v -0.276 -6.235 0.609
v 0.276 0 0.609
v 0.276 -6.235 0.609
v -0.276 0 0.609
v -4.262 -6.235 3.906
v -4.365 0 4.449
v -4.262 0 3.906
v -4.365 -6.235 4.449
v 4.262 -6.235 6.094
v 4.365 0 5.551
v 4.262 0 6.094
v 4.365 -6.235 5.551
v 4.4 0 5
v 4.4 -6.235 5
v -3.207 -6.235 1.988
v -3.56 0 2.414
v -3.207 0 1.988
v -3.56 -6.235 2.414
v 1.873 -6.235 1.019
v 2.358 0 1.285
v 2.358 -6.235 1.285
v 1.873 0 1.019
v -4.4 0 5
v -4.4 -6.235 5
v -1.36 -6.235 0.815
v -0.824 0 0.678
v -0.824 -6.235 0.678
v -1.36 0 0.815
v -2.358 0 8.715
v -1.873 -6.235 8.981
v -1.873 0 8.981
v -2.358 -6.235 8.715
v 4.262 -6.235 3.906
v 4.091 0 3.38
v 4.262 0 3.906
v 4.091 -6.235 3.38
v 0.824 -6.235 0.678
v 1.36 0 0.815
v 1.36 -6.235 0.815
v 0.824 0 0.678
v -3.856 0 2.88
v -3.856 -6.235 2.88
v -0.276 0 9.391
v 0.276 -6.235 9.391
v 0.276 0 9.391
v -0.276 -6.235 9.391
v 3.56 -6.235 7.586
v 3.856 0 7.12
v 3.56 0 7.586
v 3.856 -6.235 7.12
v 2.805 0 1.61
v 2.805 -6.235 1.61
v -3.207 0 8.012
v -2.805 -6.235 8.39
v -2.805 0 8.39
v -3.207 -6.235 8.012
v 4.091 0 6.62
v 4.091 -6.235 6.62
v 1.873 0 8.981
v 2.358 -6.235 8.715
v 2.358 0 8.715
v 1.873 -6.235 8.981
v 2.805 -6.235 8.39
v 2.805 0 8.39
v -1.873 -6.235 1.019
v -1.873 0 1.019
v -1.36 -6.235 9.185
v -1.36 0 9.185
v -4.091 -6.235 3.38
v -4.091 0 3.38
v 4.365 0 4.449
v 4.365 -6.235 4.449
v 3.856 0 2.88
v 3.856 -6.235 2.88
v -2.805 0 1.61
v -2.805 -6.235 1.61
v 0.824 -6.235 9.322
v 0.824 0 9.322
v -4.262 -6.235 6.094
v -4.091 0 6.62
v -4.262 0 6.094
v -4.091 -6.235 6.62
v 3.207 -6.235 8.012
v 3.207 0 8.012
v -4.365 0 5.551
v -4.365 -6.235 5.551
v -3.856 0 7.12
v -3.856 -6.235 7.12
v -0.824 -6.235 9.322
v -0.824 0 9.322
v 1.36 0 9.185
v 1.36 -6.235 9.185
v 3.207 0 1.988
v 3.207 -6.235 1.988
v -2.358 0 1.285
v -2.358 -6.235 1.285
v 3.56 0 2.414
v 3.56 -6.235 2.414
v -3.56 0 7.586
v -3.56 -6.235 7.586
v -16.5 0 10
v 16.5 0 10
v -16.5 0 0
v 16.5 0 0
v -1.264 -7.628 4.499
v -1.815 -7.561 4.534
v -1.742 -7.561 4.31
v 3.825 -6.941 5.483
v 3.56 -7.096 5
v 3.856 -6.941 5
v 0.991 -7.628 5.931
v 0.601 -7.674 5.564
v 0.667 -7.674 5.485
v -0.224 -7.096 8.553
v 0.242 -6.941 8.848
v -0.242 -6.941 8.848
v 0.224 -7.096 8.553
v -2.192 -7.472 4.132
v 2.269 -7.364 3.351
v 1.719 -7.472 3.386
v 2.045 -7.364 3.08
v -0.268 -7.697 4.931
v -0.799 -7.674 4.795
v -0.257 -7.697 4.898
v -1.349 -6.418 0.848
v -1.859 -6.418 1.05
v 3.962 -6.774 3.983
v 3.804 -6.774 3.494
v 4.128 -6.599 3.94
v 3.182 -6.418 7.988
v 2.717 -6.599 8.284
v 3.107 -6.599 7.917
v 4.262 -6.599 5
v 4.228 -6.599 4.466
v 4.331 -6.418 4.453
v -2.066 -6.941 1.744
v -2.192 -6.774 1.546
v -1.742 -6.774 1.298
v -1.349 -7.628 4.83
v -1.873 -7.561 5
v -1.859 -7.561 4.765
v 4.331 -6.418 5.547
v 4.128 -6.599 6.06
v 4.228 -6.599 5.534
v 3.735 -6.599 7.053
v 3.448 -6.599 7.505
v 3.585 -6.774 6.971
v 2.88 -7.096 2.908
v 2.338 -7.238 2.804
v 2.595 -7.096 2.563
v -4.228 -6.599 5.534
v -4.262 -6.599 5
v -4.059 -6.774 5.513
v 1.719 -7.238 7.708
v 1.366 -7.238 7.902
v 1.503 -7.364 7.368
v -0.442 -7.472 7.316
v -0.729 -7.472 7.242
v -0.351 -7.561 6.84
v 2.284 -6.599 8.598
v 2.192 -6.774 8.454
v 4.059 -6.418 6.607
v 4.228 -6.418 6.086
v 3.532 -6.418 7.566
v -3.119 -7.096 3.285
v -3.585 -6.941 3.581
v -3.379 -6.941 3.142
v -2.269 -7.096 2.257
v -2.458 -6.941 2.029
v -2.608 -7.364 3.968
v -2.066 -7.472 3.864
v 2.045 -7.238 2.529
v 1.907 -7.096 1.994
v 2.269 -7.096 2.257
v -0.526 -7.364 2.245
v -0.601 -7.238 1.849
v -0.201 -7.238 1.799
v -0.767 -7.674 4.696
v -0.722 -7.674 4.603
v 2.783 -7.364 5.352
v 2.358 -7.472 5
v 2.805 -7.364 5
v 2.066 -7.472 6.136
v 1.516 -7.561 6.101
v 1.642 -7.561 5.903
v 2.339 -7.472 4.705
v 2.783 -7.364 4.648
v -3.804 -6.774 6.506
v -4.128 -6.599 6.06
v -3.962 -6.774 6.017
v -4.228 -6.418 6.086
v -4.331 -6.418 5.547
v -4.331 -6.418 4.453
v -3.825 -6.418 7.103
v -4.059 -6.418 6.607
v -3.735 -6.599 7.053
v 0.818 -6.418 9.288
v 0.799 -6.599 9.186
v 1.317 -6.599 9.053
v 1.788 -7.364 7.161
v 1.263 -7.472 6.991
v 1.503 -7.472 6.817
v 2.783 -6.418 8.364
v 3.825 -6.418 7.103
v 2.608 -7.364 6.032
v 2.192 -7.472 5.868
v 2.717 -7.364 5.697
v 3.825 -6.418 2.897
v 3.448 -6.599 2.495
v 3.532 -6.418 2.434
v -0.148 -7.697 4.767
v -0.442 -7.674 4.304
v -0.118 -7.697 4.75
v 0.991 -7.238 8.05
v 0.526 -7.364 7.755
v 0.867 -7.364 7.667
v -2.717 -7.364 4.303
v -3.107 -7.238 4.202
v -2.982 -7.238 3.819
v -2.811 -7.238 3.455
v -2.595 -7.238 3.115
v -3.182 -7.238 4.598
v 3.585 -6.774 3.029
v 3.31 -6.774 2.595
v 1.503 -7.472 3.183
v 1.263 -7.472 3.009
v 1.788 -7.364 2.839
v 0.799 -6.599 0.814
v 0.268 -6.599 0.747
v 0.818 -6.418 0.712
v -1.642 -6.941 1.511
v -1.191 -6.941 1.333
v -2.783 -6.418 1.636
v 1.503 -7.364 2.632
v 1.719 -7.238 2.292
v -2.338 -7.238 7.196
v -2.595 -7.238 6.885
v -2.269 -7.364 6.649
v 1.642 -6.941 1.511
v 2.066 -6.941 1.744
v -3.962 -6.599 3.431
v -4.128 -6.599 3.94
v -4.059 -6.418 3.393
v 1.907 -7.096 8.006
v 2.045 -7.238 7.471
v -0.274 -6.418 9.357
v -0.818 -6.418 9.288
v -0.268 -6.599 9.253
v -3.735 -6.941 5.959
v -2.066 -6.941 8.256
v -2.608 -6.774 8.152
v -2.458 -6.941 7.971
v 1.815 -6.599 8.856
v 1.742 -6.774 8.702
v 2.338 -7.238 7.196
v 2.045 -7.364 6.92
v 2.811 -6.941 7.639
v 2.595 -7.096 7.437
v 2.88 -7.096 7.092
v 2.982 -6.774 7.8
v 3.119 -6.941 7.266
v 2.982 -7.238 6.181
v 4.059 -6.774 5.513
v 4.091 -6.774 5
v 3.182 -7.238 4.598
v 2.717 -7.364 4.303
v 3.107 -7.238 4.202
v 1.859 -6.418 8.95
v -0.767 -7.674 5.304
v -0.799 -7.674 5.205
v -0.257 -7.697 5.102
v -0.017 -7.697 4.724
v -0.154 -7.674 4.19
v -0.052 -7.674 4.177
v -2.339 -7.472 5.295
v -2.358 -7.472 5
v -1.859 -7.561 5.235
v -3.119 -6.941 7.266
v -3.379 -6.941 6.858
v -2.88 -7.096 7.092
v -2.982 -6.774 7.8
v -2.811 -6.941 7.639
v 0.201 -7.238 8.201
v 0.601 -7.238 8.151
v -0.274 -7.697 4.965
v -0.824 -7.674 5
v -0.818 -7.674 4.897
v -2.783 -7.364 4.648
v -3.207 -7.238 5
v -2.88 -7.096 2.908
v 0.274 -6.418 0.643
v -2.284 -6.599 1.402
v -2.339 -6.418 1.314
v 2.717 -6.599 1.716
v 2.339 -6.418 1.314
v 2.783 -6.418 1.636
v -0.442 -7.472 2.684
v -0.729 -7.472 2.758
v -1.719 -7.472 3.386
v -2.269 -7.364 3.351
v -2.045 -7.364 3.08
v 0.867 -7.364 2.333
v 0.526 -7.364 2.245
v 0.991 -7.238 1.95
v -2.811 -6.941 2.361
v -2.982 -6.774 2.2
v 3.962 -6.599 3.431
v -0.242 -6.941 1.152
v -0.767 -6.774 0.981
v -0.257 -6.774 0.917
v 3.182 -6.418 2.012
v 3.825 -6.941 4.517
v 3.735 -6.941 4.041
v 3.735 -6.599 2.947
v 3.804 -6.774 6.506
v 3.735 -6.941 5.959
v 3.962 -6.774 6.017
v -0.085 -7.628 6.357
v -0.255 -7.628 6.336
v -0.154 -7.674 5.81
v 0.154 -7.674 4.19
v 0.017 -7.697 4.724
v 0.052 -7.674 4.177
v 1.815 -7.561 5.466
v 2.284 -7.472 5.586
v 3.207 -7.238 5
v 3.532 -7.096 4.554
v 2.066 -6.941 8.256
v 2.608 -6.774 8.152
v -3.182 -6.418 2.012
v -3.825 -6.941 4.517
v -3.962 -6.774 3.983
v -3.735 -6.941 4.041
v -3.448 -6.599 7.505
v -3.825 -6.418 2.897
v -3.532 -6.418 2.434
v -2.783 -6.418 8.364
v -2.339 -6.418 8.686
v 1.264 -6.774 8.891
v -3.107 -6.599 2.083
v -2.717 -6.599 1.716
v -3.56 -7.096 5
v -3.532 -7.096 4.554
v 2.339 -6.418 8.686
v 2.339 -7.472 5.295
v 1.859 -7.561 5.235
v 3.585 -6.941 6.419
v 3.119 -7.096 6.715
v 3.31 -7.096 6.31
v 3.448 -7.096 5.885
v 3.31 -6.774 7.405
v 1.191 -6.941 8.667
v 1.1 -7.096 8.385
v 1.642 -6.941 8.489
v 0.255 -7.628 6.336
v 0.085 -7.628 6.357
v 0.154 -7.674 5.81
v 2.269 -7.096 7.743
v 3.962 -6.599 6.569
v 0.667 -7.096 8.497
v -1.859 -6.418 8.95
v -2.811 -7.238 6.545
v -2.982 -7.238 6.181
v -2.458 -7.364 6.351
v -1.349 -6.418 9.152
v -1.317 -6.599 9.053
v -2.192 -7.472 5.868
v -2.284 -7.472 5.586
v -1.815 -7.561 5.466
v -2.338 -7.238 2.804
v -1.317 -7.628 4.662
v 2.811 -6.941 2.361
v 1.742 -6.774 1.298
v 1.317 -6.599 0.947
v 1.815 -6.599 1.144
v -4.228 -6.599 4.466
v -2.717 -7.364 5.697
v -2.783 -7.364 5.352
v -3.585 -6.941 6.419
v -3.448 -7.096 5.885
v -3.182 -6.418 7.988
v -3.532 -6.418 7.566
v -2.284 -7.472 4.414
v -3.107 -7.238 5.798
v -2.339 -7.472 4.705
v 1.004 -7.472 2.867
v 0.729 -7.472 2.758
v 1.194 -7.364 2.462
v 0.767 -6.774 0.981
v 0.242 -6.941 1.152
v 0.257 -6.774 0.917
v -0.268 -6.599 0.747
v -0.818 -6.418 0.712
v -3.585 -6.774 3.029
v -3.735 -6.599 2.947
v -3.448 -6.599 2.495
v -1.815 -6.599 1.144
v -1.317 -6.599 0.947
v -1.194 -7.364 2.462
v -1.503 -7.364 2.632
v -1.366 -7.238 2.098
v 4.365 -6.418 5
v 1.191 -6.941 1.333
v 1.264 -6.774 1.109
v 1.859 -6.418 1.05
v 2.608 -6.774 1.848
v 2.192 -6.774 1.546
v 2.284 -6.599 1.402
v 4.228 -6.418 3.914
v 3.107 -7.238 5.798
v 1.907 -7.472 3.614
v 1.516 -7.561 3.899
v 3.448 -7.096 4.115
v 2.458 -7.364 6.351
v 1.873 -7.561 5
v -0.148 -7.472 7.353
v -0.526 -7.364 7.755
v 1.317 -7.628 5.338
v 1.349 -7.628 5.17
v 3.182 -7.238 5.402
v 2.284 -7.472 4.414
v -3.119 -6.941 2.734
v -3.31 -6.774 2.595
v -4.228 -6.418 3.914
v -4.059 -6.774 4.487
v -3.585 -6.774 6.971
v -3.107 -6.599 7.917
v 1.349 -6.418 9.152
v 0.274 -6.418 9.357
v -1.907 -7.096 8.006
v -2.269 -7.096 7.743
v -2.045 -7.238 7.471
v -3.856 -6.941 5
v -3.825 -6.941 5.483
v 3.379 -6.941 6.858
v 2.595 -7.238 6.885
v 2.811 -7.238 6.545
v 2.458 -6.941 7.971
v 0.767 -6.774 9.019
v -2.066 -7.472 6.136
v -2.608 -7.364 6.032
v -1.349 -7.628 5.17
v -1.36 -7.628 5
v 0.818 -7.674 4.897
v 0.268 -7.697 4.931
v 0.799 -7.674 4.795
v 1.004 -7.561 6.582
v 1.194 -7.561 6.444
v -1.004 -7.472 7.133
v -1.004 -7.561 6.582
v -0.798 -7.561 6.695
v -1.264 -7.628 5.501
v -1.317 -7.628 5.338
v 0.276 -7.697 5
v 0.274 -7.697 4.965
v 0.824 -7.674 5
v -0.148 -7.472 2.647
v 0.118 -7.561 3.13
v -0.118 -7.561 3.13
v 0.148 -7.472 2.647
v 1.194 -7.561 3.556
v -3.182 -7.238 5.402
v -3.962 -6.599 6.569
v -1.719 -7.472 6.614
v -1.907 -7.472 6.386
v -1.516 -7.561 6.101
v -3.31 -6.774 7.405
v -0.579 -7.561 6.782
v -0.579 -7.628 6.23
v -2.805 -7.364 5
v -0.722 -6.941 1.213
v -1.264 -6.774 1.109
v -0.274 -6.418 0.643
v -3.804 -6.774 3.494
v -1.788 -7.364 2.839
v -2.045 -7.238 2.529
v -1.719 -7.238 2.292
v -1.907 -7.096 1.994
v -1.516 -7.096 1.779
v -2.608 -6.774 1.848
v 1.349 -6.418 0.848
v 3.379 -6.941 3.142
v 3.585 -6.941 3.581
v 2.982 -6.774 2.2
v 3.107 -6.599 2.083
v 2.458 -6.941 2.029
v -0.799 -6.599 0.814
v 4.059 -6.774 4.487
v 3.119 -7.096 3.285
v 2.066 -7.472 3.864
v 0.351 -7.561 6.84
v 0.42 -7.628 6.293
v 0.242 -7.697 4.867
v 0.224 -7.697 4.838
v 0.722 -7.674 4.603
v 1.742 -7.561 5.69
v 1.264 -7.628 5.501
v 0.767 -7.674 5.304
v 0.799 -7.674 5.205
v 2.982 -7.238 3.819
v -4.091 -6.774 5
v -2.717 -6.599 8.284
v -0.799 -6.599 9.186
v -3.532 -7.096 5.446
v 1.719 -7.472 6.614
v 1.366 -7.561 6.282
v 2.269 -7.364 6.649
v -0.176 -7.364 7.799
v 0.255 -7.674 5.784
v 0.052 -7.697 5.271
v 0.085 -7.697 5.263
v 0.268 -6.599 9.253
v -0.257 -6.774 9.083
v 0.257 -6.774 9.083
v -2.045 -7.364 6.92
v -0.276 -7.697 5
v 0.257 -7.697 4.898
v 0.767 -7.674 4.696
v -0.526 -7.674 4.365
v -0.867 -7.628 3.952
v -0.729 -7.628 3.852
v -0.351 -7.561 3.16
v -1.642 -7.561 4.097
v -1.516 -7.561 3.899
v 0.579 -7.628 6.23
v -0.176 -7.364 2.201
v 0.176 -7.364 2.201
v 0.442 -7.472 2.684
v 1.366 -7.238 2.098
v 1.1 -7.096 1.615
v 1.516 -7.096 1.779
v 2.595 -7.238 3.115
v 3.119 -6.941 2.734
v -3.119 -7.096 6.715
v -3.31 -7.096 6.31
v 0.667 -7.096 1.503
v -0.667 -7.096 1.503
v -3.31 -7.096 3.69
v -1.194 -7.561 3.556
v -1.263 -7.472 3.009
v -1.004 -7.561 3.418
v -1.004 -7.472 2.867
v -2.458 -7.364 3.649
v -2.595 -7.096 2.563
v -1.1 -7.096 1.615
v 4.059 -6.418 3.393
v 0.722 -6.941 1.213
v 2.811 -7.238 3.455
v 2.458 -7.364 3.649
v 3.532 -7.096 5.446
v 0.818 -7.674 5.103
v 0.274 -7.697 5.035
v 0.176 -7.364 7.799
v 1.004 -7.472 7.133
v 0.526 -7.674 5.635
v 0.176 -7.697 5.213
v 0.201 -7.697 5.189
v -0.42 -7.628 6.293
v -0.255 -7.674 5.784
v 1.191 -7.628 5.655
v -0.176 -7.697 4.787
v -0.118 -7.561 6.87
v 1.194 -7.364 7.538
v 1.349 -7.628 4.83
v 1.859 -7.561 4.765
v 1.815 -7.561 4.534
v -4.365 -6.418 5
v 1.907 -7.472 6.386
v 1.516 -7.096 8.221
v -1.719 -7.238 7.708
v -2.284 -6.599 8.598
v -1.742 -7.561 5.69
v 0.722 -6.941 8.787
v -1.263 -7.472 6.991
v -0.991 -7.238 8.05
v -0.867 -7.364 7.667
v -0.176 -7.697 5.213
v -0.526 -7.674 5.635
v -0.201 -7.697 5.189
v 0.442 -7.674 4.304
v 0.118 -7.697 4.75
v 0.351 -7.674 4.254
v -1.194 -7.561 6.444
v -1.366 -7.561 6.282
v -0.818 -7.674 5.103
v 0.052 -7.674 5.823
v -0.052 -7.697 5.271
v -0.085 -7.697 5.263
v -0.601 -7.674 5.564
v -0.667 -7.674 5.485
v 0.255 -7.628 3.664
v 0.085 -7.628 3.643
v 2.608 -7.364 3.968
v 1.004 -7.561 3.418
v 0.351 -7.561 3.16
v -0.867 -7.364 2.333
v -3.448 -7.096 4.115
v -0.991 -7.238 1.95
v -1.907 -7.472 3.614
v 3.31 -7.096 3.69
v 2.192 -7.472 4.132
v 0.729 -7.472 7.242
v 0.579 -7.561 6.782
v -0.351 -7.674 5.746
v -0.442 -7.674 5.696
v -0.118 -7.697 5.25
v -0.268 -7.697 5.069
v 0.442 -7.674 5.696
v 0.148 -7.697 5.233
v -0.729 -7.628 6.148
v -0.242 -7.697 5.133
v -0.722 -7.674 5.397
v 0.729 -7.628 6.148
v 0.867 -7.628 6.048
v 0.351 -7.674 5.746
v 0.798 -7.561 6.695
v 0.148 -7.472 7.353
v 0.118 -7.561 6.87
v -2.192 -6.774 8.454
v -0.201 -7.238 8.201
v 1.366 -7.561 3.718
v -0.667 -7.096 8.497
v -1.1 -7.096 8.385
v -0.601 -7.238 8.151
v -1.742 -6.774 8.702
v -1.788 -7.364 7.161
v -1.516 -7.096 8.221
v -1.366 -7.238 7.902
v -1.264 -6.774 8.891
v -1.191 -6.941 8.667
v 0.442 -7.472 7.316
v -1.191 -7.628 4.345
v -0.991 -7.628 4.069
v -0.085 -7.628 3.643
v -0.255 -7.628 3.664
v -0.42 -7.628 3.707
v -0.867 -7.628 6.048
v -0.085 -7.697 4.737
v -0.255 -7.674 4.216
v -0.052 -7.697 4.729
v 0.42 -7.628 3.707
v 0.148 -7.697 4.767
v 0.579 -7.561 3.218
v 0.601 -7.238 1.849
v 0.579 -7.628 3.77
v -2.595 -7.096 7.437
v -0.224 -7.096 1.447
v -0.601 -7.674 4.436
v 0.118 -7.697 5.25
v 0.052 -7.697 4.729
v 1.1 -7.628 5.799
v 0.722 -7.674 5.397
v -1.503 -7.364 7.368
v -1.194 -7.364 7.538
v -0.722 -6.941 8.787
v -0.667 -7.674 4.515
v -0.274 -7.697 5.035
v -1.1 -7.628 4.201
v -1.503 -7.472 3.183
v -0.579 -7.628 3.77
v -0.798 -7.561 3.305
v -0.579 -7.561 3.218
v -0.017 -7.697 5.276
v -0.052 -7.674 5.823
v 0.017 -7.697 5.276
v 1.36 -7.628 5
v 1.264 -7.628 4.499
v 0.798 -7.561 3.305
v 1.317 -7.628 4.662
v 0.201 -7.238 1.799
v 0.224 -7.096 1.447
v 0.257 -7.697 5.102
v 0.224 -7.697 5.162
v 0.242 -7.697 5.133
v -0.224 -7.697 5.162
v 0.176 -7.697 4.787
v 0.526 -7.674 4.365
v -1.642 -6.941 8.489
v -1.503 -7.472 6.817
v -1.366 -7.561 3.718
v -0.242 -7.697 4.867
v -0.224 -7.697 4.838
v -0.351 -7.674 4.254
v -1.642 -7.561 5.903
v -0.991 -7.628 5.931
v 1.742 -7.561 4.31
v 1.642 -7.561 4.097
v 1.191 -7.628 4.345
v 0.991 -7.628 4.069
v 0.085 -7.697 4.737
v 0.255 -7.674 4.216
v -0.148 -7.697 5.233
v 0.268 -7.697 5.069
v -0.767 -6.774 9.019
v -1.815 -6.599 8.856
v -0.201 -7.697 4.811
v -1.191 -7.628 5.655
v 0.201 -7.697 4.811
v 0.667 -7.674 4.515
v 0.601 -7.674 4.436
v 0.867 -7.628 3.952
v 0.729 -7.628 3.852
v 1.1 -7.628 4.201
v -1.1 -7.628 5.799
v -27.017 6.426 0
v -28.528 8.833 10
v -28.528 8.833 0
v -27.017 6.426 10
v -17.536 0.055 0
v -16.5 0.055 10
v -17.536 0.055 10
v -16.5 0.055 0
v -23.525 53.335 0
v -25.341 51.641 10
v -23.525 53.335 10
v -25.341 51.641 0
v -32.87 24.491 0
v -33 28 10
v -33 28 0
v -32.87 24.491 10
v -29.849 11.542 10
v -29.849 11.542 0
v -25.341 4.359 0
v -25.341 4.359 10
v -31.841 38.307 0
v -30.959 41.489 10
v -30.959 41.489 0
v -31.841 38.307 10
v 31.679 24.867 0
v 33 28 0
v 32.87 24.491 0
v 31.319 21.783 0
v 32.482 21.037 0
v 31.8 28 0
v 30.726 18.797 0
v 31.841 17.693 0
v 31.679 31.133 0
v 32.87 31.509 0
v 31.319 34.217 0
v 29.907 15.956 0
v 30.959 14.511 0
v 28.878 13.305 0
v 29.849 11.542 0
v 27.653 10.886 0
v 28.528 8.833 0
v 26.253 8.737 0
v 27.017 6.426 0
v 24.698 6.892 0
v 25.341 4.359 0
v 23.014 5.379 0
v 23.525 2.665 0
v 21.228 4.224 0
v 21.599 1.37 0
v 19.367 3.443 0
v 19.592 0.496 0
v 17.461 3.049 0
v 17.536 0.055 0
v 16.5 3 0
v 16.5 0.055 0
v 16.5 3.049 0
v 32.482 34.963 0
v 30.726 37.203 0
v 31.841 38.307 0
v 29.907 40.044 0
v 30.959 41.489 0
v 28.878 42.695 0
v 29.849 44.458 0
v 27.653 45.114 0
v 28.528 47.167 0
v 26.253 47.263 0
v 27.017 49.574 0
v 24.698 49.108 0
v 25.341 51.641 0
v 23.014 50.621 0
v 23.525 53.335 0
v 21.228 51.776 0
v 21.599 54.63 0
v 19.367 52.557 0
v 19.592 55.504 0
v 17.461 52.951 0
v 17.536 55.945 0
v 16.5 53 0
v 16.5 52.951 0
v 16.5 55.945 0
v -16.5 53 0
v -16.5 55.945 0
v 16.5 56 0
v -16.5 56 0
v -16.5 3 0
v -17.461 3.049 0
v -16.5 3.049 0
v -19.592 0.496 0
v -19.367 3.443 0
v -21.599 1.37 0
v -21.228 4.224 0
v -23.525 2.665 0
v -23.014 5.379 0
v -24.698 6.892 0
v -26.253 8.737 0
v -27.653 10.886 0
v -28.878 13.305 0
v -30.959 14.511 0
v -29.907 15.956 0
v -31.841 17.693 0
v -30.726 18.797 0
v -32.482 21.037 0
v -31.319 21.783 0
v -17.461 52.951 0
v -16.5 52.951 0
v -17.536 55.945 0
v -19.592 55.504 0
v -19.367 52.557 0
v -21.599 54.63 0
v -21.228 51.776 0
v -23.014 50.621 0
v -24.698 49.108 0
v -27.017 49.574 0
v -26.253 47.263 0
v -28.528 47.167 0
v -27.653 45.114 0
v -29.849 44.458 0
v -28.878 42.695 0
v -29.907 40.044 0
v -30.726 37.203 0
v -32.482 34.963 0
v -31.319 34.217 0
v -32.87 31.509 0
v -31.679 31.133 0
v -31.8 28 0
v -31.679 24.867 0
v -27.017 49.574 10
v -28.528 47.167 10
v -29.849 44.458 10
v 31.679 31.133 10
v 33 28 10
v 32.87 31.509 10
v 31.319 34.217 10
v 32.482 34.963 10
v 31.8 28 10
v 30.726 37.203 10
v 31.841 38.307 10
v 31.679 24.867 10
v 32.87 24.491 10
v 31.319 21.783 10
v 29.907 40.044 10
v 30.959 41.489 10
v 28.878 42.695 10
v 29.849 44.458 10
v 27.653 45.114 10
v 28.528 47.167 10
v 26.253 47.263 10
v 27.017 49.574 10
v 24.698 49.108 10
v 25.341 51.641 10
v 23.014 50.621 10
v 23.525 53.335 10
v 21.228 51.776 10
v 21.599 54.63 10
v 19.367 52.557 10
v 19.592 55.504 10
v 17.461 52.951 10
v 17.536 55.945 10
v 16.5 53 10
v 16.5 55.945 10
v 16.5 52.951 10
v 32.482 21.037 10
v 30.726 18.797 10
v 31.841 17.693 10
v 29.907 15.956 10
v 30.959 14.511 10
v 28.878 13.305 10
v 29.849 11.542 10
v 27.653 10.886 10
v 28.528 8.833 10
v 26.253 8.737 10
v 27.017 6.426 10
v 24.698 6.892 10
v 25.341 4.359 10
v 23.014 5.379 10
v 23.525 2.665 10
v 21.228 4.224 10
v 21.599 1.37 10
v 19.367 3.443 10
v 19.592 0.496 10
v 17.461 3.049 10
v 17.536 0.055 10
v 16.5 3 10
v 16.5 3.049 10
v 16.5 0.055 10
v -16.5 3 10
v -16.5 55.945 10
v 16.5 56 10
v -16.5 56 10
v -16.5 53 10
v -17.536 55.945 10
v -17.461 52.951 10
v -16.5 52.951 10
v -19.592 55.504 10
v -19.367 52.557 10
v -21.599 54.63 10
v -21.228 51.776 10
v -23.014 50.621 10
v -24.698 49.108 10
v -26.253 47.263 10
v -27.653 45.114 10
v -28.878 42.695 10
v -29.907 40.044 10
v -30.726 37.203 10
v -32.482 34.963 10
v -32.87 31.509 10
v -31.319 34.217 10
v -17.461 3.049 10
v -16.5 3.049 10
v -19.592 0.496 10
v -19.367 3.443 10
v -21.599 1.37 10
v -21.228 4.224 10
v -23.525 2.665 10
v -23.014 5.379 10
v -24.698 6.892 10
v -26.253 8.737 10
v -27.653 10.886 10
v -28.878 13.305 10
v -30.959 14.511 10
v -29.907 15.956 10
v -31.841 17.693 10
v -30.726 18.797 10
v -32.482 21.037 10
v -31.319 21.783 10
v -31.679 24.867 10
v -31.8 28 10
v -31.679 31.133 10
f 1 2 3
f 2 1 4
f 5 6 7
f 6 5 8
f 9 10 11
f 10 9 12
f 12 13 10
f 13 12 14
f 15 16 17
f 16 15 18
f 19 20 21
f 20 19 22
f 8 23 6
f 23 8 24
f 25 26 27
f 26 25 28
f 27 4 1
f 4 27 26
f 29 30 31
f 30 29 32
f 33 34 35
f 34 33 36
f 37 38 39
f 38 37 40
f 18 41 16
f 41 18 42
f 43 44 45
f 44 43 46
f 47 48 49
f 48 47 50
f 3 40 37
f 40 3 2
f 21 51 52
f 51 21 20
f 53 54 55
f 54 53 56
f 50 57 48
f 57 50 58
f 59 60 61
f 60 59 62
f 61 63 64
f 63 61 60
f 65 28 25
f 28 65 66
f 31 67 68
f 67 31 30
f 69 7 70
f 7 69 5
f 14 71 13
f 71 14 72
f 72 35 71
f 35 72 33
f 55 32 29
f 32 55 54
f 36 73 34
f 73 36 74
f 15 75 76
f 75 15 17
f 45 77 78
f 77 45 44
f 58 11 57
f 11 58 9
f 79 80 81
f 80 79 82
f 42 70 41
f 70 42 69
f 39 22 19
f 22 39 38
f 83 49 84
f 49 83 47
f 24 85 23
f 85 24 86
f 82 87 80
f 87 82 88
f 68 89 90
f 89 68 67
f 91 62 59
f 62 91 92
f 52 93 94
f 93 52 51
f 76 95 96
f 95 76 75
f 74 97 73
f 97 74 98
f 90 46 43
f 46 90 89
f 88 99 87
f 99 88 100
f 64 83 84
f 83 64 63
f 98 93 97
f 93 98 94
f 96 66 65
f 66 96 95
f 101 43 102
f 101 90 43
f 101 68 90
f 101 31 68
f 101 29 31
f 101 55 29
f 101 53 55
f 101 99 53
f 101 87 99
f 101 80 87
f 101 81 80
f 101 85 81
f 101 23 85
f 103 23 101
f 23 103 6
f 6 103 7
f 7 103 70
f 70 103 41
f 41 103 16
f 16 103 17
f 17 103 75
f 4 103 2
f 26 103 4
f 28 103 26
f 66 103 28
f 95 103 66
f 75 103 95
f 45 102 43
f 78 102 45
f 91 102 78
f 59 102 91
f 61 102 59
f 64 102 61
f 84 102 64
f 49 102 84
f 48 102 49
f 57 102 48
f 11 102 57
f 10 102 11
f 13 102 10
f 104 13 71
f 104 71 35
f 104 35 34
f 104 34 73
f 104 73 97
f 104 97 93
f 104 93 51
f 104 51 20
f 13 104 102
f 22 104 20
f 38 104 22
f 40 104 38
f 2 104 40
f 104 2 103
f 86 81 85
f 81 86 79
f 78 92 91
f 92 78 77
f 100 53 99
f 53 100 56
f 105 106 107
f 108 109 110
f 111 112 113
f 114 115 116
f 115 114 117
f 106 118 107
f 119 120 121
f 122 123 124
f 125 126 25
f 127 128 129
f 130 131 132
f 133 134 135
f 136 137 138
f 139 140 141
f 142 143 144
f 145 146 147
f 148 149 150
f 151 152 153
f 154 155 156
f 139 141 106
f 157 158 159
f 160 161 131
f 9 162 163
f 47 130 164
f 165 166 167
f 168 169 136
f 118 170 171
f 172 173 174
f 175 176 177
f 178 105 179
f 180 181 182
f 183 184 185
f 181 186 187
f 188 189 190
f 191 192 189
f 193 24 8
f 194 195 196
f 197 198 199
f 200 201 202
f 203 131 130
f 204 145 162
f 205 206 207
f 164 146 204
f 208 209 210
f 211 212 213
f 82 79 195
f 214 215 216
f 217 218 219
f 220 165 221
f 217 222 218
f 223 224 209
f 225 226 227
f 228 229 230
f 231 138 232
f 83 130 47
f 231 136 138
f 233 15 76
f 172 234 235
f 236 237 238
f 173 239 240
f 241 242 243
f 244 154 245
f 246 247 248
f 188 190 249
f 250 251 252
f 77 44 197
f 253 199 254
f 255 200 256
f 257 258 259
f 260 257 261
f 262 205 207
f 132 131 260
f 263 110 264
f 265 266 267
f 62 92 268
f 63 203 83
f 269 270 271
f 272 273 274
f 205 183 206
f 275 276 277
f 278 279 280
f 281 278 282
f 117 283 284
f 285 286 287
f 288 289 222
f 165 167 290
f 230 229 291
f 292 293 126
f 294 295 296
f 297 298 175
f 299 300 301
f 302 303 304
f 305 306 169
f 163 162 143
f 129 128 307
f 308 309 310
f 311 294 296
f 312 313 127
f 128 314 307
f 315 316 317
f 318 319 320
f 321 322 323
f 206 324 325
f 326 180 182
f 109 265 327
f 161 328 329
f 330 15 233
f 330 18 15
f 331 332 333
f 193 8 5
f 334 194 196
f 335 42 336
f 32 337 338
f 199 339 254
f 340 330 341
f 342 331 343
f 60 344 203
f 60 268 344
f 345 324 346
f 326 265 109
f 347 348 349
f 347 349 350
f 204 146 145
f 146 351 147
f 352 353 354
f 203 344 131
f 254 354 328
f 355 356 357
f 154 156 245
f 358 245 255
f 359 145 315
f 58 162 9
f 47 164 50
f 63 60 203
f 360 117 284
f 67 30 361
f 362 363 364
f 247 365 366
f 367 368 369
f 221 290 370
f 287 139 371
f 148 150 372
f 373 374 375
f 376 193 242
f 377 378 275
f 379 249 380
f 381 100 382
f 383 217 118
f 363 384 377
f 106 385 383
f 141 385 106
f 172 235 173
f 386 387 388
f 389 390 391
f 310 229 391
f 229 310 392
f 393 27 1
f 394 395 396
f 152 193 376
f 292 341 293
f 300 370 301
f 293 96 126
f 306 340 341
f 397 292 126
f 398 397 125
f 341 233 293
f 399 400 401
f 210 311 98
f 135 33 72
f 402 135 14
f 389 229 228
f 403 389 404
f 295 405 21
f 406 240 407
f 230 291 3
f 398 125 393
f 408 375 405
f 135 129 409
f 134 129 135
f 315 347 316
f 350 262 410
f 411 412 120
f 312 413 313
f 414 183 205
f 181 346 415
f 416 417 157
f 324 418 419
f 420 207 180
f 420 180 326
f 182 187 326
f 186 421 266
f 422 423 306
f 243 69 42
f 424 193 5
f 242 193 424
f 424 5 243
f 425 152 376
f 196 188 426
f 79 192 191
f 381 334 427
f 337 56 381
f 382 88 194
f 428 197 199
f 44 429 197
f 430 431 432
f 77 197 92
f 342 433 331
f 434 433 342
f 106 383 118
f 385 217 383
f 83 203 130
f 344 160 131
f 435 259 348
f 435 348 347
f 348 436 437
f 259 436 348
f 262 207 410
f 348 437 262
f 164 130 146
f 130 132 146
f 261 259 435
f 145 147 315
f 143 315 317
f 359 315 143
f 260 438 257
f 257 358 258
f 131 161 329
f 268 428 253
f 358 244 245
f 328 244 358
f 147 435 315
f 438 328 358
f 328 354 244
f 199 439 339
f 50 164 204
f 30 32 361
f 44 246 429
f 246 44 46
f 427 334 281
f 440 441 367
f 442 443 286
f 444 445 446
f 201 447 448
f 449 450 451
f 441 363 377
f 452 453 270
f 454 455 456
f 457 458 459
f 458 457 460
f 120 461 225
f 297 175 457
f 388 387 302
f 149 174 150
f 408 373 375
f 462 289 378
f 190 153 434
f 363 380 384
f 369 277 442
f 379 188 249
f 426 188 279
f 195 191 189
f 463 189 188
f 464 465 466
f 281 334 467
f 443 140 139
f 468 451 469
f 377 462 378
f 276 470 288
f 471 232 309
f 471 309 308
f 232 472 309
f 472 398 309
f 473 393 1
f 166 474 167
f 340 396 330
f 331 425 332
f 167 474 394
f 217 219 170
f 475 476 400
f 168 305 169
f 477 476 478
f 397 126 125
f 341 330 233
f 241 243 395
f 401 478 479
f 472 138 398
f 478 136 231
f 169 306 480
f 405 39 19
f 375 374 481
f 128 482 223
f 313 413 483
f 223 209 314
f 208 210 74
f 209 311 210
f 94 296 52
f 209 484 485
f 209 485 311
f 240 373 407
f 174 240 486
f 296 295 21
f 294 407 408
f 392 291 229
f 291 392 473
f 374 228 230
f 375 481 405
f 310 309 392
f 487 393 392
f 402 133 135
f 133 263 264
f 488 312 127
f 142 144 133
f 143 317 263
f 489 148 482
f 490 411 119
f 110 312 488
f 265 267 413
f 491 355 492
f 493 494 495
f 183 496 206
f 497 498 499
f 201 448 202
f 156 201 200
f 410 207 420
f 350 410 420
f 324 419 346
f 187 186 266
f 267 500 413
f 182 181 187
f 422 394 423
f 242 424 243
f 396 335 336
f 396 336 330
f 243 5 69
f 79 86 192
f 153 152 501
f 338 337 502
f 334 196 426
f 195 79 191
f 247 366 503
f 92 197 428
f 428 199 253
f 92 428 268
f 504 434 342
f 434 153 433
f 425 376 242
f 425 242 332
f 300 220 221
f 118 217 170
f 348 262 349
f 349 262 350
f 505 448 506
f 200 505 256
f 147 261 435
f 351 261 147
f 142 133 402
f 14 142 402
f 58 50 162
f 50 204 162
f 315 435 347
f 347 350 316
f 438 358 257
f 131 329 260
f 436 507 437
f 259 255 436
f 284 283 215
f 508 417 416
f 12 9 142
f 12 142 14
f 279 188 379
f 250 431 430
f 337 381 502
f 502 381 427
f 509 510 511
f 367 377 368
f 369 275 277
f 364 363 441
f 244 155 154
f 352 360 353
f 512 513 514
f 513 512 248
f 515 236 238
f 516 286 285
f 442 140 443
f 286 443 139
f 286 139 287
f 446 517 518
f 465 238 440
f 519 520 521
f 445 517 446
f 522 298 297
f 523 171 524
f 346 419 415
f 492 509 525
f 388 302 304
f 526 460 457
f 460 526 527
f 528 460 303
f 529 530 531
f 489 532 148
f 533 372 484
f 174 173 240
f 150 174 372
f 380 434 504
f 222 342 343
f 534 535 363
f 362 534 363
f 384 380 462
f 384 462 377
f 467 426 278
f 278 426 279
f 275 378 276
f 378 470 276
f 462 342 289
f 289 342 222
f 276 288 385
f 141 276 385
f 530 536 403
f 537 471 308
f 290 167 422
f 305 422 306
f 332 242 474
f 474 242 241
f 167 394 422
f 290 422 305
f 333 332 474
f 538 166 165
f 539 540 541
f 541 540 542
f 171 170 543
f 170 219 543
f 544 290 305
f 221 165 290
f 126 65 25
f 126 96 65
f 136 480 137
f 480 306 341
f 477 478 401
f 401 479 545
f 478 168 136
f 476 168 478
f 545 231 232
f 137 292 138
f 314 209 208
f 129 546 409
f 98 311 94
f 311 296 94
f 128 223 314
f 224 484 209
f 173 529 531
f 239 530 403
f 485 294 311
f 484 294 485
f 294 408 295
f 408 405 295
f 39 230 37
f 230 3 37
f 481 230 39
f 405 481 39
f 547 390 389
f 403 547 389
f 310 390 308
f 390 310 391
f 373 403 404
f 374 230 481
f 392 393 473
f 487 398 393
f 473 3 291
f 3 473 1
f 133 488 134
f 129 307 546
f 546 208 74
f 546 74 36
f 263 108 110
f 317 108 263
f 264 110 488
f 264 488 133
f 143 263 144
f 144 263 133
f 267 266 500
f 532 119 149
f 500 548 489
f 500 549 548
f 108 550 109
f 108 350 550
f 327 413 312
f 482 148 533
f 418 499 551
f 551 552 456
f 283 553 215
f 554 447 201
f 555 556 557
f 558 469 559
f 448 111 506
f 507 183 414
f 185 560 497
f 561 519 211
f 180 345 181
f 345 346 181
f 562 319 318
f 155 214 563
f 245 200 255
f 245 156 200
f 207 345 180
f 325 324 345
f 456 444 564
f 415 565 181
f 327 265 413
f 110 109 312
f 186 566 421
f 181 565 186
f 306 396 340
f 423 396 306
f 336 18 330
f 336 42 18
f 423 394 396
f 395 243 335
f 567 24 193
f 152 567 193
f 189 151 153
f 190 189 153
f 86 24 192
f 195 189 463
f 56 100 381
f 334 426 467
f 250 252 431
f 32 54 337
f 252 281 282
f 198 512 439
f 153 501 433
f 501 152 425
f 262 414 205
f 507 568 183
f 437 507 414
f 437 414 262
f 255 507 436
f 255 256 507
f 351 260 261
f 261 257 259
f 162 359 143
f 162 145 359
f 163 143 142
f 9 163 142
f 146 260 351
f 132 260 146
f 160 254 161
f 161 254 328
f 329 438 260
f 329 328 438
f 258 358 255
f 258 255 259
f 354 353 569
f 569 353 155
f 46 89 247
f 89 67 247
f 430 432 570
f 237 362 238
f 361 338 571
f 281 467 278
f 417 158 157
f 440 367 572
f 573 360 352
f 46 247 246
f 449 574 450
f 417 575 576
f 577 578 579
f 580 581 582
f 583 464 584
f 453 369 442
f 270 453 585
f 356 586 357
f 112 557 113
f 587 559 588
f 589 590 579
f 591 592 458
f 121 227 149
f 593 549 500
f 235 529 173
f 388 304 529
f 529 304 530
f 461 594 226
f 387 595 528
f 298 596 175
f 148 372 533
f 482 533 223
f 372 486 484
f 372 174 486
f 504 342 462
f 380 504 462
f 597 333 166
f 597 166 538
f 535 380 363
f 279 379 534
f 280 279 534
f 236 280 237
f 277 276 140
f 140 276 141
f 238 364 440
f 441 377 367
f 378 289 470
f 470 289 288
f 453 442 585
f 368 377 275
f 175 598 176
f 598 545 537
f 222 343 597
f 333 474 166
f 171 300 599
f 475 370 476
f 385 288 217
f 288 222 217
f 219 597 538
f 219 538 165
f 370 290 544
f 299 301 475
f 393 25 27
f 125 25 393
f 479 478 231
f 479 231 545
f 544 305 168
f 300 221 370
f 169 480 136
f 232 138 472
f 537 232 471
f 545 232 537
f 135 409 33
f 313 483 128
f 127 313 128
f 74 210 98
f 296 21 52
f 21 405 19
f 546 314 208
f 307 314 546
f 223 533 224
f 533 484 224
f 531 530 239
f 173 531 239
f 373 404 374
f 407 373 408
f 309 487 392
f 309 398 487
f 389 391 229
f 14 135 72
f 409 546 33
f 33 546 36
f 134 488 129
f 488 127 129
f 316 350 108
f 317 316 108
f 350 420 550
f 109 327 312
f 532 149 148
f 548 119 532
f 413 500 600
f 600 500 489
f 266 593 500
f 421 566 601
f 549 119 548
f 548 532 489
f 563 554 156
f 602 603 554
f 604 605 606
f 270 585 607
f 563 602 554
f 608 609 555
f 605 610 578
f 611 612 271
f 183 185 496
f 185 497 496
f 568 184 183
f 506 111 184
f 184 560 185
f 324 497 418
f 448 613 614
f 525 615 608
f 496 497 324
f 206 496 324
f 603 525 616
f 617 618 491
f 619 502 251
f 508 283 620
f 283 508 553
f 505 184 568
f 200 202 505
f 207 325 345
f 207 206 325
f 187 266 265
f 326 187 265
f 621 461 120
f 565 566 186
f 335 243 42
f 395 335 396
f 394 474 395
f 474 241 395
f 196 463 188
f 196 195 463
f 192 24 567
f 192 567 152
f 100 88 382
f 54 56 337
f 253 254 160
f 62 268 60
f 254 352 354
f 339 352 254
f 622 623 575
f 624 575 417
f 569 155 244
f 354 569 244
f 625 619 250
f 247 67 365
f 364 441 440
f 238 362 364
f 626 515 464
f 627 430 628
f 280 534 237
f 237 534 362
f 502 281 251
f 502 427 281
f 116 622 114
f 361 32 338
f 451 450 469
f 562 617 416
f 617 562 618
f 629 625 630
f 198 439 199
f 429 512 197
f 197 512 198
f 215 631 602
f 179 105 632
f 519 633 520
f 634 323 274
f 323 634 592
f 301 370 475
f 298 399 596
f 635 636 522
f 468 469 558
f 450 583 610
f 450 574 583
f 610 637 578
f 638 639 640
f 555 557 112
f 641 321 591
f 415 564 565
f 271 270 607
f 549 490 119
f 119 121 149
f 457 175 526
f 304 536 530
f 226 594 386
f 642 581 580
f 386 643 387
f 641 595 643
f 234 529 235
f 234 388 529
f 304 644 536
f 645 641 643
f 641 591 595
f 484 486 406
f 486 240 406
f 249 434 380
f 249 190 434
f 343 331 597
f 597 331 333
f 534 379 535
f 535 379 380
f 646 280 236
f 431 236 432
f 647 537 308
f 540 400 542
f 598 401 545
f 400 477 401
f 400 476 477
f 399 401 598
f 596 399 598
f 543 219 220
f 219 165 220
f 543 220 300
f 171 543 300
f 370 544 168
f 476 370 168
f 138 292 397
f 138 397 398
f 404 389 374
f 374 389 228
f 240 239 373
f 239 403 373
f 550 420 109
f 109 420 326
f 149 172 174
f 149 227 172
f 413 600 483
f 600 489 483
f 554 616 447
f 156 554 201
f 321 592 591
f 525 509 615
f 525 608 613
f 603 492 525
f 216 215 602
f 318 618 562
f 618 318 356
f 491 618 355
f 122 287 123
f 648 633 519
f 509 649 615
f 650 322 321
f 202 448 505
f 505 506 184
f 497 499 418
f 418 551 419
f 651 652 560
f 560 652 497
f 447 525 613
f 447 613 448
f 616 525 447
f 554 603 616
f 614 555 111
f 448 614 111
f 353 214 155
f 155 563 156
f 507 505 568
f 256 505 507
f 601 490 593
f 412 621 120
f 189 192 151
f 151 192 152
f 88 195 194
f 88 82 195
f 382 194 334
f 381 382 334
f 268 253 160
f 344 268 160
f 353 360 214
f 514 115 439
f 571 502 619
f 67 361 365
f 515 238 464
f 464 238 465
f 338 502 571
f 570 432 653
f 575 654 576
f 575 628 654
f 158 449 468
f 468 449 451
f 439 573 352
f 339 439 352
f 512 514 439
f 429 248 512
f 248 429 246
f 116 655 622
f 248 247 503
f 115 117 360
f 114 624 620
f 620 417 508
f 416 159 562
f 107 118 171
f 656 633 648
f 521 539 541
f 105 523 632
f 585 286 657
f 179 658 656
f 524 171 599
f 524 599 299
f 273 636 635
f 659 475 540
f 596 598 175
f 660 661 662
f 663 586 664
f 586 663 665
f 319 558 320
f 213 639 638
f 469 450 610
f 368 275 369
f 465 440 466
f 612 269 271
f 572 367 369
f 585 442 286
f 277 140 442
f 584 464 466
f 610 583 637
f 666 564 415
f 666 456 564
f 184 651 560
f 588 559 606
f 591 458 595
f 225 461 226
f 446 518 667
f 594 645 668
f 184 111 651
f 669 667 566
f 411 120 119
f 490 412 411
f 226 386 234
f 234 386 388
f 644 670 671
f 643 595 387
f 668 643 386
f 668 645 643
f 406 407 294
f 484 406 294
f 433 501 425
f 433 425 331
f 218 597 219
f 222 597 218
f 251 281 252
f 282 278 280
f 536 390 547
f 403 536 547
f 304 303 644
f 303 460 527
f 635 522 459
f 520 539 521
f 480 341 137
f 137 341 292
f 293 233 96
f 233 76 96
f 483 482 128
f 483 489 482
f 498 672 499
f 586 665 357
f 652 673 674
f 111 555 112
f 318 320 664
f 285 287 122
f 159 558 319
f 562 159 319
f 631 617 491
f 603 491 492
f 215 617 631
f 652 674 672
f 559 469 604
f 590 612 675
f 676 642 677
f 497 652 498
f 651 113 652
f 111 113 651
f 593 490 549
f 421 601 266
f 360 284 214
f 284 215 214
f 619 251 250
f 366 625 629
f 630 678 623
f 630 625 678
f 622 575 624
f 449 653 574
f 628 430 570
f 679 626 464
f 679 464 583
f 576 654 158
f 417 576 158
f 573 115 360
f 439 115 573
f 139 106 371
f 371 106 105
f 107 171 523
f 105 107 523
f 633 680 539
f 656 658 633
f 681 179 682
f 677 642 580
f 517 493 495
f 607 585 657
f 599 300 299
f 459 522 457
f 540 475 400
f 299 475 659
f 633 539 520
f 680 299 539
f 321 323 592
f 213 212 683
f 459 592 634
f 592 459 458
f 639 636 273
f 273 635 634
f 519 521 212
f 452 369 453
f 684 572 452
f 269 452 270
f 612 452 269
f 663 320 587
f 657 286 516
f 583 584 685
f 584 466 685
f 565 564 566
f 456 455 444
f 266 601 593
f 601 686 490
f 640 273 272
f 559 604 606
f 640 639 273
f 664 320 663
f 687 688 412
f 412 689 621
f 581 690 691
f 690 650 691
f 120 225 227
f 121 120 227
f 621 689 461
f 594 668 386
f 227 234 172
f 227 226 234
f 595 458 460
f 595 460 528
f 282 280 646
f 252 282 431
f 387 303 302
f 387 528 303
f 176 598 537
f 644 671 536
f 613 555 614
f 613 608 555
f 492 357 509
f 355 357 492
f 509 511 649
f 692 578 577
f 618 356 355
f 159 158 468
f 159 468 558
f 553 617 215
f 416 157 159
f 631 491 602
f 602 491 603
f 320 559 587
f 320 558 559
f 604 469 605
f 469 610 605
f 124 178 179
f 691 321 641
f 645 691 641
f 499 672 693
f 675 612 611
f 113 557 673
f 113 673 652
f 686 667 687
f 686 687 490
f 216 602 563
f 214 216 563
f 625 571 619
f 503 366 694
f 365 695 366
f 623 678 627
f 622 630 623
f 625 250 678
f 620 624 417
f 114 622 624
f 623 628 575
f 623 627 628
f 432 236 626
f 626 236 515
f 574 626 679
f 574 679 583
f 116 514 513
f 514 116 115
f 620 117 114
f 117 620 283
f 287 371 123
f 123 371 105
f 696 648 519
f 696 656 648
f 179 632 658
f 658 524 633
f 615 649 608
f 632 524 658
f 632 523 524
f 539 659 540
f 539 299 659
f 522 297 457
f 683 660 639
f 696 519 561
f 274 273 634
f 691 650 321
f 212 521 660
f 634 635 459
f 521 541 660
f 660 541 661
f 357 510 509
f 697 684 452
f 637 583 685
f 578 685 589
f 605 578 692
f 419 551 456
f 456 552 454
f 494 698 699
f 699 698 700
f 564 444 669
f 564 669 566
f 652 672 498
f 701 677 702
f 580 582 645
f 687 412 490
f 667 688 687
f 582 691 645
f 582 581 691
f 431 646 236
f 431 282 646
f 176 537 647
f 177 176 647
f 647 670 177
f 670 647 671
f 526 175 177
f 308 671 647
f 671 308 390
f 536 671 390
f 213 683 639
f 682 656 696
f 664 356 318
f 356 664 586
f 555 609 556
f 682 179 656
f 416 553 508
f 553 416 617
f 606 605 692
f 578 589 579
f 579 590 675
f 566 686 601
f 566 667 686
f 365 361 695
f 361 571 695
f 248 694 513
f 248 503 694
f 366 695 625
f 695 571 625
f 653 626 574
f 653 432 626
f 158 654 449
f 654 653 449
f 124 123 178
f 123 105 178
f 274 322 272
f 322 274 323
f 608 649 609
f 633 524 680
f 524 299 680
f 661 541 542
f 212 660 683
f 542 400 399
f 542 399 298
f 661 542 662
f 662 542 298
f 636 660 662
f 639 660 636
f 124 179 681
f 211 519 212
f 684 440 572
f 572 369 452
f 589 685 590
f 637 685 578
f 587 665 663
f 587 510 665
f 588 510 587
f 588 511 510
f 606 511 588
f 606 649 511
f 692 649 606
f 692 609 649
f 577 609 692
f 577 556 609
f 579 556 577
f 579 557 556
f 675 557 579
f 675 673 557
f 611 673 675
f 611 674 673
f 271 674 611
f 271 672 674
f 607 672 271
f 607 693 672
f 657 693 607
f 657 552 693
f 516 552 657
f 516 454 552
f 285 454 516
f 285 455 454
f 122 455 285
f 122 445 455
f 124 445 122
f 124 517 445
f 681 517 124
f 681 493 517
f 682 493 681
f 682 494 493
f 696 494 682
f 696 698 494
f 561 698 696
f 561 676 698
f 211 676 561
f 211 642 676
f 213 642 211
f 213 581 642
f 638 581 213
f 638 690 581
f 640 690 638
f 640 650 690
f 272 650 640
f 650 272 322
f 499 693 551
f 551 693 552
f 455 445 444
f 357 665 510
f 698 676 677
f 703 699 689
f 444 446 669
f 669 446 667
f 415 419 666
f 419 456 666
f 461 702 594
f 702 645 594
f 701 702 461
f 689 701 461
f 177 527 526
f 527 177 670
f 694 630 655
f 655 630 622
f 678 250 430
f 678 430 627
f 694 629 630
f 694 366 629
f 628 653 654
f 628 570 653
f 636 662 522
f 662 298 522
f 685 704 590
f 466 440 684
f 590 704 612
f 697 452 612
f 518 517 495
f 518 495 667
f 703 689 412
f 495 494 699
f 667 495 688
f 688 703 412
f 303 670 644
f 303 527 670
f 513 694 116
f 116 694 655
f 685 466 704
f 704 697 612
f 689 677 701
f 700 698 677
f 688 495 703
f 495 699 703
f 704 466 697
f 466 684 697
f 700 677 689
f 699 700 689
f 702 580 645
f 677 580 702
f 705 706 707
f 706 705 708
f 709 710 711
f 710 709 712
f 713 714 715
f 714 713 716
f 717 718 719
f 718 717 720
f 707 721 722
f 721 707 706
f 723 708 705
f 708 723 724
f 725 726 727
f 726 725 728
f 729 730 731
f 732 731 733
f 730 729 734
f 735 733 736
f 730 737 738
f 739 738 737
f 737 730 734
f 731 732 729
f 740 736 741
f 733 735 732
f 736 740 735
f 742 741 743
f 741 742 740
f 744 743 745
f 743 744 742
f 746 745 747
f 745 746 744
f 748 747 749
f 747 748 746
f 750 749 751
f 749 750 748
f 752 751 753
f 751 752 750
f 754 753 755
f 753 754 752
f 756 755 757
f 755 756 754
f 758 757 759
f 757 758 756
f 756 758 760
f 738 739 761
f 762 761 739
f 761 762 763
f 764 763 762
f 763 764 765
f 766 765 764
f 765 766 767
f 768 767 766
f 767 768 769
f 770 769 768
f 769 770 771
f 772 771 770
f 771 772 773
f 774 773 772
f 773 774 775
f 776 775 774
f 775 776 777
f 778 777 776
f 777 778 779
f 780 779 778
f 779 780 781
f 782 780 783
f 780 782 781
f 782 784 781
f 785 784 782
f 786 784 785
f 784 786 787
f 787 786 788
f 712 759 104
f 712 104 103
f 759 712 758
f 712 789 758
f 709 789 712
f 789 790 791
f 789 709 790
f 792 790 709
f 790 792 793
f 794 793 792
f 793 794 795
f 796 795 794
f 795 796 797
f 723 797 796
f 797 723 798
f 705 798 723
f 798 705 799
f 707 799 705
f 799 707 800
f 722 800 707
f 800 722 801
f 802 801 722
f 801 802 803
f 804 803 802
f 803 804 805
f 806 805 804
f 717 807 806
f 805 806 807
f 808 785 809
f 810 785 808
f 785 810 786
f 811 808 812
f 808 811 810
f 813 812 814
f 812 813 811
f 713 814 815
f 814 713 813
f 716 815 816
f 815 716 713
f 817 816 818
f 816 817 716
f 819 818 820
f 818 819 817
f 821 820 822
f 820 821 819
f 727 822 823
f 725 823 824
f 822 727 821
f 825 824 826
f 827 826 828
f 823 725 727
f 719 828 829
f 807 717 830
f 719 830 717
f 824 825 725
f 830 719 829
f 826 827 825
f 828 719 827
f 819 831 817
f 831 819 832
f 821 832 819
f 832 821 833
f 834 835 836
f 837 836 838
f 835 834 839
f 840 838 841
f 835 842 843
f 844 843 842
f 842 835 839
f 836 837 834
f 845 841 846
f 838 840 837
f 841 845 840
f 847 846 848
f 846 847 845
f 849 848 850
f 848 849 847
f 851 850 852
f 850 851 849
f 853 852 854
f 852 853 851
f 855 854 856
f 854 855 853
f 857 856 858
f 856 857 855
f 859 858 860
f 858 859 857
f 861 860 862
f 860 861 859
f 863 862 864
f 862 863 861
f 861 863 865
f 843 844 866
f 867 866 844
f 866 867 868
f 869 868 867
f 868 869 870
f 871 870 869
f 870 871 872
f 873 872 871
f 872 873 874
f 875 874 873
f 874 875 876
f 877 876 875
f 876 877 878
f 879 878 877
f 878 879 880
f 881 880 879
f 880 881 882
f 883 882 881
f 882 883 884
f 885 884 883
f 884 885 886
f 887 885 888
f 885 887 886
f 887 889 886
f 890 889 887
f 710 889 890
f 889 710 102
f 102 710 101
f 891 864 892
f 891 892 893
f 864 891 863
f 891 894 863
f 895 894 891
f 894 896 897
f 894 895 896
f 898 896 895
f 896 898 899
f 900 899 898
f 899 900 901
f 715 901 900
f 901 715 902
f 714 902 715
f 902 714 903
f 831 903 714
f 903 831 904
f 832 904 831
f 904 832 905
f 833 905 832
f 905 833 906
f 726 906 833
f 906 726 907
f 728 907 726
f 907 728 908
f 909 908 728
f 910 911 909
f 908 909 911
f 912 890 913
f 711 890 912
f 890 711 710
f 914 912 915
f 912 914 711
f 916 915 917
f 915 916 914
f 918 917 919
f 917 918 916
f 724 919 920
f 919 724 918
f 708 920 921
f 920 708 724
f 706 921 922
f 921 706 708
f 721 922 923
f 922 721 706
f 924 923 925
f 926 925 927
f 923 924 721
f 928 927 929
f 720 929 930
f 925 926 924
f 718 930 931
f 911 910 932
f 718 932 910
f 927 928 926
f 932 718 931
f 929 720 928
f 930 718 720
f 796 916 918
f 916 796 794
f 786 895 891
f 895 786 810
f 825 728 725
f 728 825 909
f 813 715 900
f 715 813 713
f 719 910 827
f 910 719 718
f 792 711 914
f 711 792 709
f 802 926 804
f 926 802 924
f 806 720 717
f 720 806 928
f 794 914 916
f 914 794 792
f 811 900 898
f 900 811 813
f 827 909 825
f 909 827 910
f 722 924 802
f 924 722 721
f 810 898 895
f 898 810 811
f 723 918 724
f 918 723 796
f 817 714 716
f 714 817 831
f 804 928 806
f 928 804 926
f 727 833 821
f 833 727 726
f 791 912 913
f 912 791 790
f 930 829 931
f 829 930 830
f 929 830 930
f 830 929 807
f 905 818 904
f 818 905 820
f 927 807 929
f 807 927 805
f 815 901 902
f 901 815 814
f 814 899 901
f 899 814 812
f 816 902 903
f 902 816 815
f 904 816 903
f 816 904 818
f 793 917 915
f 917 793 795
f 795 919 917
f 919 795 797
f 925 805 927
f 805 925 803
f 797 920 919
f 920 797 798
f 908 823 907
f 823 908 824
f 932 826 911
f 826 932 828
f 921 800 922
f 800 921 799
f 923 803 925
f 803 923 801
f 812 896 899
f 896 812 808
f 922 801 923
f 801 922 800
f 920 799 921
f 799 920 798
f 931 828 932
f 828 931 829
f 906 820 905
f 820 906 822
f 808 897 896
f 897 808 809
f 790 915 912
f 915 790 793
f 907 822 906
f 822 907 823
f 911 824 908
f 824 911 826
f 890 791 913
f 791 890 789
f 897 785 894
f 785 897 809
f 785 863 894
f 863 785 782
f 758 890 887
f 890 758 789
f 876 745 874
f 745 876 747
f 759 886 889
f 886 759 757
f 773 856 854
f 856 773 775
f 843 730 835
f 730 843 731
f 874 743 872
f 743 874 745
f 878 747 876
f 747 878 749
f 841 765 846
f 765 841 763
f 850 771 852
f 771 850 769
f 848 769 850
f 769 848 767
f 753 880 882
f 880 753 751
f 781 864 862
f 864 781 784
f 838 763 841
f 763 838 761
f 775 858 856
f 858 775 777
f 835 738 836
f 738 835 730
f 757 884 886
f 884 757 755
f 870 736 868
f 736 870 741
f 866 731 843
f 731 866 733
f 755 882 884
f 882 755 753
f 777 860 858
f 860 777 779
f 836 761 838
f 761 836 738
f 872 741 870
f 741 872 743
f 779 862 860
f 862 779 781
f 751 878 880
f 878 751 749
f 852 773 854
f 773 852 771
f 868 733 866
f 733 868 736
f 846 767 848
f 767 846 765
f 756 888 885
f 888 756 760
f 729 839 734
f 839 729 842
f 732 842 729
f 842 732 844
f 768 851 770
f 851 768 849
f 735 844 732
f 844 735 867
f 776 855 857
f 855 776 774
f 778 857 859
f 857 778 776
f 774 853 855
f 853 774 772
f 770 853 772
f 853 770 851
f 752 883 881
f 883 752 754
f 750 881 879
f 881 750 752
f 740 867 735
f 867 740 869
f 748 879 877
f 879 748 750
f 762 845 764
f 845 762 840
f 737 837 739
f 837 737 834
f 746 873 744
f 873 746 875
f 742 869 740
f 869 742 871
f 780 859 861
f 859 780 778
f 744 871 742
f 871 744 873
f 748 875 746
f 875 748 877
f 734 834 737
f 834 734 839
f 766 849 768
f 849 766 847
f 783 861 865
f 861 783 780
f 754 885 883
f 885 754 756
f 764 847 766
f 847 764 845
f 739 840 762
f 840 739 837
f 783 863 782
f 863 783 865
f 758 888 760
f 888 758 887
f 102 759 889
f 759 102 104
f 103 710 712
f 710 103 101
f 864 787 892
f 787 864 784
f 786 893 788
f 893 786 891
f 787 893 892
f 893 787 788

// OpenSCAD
height=10;
breadth=3;
breadth_small=1.2;
length=66;
gap_width=50;
roundness=0.5;
knob_diameter=8.8;
knob_roundness=0.333;
knob_length=7.7;

$fn=50;

straight_length=length*(1-roundness);

module knob(l) {
    cylinder(h=l-(knob_diameter*knob_roundness)/2,d=knob_diameter);
    translate([0,0,l-(knob_diameter*knob_roundness)/2]) scale([1,1,knob_roundness]) sphere(knob_diameter/2);
}

module roundPart() {
    difference() {
        translate([-straight_length/2,gap_width/2+breadth,0]) scale([(length-straight_length)/(gap_width+breadth*2),1,1]) cylinder(h=height,d=gap_width+breadth*2);
        translate([-straight_length/2,gap_width/2+breadth,-0.01]) scale([(length-straight_length-breadth_small*2)/gap_width,1,1]) cylinder(h=height+0.02,d=gap_width);
        translate([-straight_length/2,breadth,-0.01]) cube([length,gap_width,height+0.02]);
    }
}

translate([0,0,height/2]) rotate([90,0,0]) knob(knob_length);
translate([-straight_length/2,0,0]) cube([straight_length,breadth,height]);
translate([-straight_length/2,gap_width+breadth,0]) cube([straight_length,breadth,height]);
roundPart();
mirror([1,0,0]) roundPart();
